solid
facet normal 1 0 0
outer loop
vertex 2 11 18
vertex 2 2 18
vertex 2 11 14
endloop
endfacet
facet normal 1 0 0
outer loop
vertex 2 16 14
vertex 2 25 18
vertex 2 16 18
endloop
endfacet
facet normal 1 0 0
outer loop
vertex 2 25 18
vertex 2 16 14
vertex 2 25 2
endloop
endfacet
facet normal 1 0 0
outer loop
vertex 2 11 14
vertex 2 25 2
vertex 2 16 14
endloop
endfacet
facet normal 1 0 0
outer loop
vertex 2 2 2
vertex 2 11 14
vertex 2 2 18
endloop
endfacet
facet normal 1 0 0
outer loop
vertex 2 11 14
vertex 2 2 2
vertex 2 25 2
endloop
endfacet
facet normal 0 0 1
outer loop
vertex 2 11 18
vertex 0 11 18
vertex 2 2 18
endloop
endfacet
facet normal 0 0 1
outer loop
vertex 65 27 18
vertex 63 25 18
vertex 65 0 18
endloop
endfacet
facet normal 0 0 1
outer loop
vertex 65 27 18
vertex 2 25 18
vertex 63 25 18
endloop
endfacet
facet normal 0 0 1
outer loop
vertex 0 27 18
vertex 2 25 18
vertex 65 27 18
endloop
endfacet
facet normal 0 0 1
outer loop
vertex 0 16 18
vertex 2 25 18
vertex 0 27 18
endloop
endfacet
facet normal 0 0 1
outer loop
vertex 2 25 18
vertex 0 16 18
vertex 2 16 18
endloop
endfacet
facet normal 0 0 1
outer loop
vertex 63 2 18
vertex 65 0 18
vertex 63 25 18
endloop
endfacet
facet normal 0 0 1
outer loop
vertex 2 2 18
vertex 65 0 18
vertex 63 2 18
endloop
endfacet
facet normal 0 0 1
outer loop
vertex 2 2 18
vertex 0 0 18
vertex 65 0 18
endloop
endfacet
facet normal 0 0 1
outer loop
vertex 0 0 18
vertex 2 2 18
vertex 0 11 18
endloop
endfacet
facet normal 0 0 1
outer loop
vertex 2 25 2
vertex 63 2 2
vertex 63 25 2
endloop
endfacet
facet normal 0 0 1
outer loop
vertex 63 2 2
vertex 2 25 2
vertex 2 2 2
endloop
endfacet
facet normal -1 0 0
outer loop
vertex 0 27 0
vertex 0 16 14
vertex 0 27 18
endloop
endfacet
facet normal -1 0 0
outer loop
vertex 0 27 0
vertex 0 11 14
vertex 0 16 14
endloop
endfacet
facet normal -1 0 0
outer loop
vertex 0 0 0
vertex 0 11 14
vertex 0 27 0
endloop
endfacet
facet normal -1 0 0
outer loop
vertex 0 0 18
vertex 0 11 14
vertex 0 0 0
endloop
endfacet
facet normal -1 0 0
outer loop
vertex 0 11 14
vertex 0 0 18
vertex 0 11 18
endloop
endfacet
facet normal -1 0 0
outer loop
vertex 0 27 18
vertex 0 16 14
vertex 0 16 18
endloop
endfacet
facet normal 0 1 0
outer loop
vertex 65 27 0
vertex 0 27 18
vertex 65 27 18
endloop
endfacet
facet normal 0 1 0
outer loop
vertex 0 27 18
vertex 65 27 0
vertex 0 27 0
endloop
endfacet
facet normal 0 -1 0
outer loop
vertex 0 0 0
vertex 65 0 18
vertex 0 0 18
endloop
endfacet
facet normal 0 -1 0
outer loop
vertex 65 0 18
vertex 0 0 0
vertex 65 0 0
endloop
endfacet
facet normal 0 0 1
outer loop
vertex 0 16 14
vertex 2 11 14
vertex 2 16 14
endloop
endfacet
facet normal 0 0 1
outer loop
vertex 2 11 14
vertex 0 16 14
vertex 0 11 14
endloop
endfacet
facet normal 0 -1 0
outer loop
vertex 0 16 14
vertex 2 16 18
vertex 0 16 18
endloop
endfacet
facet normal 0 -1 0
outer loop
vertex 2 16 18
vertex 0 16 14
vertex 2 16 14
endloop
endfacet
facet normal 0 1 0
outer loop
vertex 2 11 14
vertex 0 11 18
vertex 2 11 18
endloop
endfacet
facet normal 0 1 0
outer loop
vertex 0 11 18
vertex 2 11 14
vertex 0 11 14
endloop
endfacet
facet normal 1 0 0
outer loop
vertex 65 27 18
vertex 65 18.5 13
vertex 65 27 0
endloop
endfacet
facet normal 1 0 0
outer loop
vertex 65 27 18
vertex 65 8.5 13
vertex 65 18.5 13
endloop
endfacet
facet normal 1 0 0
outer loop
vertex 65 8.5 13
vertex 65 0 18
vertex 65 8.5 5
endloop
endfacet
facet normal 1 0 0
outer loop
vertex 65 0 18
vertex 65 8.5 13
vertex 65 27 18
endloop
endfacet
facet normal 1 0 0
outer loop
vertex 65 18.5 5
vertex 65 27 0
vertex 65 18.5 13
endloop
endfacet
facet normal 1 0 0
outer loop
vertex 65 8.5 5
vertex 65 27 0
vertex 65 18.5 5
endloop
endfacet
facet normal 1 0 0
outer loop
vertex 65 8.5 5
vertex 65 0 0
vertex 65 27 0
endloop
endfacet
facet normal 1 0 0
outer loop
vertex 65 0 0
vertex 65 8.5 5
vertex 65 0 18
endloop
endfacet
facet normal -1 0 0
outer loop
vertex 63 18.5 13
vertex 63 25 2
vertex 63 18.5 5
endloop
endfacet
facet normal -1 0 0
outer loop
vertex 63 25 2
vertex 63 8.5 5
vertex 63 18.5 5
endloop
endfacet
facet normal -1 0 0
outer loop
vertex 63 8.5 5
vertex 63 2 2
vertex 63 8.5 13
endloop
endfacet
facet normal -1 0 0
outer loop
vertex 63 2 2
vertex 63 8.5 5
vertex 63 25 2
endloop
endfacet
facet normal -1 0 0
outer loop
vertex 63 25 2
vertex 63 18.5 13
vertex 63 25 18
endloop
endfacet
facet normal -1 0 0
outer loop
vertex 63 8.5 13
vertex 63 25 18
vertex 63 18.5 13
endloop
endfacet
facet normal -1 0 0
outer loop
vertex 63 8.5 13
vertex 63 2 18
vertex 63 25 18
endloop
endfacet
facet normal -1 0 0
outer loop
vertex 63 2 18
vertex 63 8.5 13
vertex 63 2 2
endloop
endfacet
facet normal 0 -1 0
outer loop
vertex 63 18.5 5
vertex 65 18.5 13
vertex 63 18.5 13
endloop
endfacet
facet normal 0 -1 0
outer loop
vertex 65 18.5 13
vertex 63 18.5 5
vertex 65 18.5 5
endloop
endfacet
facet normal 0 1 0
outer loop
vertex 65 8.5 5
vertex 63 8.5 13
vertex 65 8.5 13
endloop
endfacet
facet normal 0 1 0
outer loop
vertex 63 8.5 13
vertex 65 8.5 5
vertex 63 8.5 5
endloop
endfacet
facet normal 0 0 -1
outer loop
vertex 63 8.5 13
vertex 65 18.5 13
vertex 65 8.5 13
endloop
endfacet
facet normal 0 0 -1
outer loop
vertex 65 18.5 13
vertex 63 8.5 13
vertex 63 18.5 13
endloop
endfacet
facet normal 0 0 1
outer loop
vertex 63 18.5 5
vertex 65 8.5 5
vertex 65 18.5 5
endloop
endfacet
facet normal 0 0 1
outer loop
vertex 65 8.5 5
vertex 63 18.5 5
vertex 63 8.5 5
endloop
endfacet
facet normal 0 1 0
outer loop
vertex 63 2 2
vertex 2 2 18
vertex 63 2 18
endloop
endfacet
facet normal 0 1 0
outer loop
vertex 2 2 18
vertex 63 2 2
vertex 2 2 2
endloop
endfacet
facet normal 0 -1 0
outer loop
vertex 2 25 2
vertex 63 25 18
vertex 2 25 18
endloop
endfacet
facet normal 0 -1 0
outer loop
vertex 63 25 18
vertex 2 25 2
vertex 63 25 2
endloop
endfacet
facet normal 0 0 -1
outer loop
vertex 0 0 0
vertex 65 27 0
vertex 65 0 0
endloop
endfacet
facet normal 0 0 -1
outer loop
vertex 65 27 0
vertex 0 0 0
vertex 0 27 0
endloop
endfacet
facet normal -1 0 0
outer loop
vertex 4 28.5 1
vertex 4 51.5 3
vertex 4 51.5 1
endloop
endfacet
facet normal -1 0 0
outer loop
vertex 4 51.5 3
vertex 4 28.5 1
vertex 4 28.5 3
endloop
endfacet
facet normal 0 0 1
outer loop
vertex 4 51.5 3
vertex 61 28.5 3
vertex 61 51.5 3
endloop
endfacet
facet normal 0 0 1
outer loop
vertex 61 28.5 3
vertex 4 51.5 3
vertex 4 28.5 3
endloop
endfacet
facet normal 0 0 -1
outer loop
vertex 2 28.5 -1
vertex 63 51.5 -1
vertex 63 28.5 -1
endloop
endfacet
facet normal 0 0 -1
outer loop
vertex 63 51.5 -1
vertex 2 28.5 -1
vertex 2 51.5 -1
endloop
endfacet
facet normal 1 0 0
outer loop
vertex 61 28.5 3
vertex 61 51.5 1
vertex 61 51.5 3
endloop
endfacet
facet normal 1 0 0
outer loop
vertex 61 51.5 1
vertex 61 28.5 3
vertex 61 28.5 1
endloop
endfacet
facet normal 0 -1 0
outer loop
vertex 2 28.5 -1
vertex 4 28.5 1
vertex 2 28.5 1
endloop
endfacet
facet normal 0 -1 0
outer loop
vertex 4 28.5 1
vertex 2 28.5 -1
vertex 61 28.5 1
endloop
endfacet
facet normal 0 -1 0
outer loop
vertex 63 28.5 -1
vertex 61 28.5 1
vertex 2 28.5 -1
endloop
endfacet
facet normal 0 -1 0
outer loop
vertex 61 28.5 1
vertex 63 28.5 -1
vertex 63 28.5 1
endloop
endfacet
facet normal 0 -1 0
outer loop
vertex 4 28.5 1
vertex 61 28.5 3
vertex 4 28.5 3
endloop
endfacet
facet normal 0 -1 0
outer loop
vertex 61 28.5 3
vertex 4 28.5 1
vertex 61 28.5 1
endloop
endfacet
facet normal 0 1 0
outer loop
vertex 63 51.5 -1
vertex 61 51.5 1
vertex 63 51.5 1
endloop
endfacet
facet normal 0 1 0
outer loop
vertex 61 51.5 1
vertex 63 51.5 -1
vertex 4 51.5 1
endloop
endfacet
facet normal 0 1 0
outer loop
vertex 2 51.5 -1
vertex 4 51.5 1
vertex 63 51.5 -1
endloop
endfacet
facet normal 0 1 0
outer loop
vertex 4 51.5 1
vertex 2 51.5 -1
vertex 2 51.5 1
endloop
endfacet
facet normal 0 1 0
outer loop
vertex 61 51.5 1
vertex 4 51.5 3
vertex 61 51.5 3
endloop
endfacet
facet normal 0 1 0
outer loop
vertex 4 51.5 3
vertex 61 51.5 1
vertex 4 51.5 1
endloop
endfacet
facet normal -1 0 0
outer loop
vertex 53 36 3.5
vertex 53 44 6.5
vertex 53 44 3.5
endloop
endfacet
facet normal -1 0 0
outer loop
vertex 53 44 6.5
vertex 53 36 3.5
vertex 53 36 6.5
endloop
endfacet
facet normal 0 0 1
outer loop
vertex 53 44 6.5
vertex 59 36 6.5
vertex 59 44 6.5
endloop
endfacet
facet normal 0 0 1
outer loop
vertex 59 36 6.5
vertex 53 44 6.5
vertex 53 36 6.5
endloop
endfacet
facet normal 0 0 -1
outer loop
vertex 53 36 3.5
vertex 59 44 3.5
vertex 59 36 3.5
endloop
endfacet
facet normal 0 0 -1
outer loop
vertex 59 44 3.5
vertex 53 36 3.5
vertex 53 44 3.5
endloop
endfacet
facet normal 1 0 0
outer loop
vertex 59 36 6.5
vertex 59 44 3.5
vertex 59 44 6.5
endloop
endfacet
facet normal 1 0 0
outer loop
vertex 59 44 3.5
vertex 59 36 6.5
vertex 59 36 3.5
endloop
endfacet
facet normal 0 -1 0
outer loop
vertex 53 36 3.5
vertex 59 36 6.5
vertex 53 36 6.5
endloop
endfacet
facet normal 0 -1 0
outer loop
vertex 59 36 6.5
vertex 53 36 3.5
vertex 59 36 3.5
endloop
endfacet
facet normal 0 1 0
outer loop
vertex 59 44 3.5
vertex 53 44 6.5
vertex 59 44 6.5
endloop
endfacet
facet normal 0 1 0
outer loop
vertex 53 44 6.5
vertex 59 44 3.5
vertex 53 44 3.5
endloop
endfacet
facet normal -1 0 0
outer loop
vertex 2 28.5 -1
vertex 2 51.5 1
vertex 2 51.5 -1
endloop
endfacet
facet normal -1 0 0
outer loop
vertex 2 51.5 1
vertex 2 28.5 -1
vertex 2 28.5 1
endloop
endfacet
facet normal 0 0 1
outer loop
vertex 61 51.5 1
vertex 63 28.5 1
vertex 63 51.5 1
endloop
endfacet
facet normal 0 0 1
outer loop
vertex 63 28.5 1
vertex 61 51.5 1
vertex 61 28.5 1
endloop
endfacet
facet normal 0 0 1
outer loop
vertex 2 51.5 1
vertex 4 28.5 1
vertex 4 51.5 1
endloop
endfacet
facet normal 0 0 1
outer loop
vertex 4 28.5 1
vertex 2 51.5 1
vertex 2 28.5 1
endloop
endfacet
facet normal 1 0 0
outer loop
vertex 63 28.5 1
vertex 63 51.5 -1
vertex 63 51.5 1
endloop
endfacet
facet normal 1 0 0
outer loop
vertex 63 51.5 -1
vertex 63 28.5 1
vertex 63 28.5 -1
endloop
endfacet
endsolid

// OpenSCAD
//  Case for USB-Jtag cable
//    2015/2/11 Yutaka Usui

// ver2:2015/5  幅に余裕を持たせる(25->27)。背を少し低く、底面の底上げをなくす。USB穴大きく(9,6=>10,8)


//d=64;
//w=24;
d=65;
w=27;
t=2;
h=16;

module wall_usbcn()   // USBコネクタ穴つきの板
{
	translate([t/2,w/2,h/2])
	rotate([90,0,90])
	
	difference() {
		cube([w,h, t], center = true);
		translate([0,-1,0]) cube([10,8,2], center=true);
		}
	

}
module wall_cable()      // ケーブル用切り欠きつきの板
{
	translate([t/2,w/2,h/2])

	difference() {
		cube([t,w,h], center = true);
		translate([0,0,7]) cube([t,5,6], center = true);
	}
}


module bottom() {
	translate([d/2,w/2,t/2])
	union() {
		cube([d,w,t], center = true);      //底板
		//translate([0,0,  5]) cube([50,12,1], center = true);  // 底板内側
	}
}

module wall() {
   //manifoldを避けるためt(板の厚み)分のがして、隣接させる
	translate([t,   0, t]) { cube([d-2*t,t,h], center = false); } 
	translate([t, w-t, t]) { cube([d-2*t,t,h], center = false); }

	translate([0,    0, t]) { wall_cable(); }
	translate([d-t, 0, t])  { wall_usbcn(); }

}


module topcover() {

	cube([d-2*t,w-2*t,t], center=true);           //メインふた
	translate([0,0,t/2]) {
		cube([d-t*4,w-t*2,t*2], center=true); //2重重ねふた
		translate([-d/2+t*4+1,0,t*2])  cube([6,8,3], center=true);  //ふたの角をつける
   }
}

//

union() {
	bottom();
	wall();
}

translate([d/2,40,0])
rotate(180,0,0)
topcover();
